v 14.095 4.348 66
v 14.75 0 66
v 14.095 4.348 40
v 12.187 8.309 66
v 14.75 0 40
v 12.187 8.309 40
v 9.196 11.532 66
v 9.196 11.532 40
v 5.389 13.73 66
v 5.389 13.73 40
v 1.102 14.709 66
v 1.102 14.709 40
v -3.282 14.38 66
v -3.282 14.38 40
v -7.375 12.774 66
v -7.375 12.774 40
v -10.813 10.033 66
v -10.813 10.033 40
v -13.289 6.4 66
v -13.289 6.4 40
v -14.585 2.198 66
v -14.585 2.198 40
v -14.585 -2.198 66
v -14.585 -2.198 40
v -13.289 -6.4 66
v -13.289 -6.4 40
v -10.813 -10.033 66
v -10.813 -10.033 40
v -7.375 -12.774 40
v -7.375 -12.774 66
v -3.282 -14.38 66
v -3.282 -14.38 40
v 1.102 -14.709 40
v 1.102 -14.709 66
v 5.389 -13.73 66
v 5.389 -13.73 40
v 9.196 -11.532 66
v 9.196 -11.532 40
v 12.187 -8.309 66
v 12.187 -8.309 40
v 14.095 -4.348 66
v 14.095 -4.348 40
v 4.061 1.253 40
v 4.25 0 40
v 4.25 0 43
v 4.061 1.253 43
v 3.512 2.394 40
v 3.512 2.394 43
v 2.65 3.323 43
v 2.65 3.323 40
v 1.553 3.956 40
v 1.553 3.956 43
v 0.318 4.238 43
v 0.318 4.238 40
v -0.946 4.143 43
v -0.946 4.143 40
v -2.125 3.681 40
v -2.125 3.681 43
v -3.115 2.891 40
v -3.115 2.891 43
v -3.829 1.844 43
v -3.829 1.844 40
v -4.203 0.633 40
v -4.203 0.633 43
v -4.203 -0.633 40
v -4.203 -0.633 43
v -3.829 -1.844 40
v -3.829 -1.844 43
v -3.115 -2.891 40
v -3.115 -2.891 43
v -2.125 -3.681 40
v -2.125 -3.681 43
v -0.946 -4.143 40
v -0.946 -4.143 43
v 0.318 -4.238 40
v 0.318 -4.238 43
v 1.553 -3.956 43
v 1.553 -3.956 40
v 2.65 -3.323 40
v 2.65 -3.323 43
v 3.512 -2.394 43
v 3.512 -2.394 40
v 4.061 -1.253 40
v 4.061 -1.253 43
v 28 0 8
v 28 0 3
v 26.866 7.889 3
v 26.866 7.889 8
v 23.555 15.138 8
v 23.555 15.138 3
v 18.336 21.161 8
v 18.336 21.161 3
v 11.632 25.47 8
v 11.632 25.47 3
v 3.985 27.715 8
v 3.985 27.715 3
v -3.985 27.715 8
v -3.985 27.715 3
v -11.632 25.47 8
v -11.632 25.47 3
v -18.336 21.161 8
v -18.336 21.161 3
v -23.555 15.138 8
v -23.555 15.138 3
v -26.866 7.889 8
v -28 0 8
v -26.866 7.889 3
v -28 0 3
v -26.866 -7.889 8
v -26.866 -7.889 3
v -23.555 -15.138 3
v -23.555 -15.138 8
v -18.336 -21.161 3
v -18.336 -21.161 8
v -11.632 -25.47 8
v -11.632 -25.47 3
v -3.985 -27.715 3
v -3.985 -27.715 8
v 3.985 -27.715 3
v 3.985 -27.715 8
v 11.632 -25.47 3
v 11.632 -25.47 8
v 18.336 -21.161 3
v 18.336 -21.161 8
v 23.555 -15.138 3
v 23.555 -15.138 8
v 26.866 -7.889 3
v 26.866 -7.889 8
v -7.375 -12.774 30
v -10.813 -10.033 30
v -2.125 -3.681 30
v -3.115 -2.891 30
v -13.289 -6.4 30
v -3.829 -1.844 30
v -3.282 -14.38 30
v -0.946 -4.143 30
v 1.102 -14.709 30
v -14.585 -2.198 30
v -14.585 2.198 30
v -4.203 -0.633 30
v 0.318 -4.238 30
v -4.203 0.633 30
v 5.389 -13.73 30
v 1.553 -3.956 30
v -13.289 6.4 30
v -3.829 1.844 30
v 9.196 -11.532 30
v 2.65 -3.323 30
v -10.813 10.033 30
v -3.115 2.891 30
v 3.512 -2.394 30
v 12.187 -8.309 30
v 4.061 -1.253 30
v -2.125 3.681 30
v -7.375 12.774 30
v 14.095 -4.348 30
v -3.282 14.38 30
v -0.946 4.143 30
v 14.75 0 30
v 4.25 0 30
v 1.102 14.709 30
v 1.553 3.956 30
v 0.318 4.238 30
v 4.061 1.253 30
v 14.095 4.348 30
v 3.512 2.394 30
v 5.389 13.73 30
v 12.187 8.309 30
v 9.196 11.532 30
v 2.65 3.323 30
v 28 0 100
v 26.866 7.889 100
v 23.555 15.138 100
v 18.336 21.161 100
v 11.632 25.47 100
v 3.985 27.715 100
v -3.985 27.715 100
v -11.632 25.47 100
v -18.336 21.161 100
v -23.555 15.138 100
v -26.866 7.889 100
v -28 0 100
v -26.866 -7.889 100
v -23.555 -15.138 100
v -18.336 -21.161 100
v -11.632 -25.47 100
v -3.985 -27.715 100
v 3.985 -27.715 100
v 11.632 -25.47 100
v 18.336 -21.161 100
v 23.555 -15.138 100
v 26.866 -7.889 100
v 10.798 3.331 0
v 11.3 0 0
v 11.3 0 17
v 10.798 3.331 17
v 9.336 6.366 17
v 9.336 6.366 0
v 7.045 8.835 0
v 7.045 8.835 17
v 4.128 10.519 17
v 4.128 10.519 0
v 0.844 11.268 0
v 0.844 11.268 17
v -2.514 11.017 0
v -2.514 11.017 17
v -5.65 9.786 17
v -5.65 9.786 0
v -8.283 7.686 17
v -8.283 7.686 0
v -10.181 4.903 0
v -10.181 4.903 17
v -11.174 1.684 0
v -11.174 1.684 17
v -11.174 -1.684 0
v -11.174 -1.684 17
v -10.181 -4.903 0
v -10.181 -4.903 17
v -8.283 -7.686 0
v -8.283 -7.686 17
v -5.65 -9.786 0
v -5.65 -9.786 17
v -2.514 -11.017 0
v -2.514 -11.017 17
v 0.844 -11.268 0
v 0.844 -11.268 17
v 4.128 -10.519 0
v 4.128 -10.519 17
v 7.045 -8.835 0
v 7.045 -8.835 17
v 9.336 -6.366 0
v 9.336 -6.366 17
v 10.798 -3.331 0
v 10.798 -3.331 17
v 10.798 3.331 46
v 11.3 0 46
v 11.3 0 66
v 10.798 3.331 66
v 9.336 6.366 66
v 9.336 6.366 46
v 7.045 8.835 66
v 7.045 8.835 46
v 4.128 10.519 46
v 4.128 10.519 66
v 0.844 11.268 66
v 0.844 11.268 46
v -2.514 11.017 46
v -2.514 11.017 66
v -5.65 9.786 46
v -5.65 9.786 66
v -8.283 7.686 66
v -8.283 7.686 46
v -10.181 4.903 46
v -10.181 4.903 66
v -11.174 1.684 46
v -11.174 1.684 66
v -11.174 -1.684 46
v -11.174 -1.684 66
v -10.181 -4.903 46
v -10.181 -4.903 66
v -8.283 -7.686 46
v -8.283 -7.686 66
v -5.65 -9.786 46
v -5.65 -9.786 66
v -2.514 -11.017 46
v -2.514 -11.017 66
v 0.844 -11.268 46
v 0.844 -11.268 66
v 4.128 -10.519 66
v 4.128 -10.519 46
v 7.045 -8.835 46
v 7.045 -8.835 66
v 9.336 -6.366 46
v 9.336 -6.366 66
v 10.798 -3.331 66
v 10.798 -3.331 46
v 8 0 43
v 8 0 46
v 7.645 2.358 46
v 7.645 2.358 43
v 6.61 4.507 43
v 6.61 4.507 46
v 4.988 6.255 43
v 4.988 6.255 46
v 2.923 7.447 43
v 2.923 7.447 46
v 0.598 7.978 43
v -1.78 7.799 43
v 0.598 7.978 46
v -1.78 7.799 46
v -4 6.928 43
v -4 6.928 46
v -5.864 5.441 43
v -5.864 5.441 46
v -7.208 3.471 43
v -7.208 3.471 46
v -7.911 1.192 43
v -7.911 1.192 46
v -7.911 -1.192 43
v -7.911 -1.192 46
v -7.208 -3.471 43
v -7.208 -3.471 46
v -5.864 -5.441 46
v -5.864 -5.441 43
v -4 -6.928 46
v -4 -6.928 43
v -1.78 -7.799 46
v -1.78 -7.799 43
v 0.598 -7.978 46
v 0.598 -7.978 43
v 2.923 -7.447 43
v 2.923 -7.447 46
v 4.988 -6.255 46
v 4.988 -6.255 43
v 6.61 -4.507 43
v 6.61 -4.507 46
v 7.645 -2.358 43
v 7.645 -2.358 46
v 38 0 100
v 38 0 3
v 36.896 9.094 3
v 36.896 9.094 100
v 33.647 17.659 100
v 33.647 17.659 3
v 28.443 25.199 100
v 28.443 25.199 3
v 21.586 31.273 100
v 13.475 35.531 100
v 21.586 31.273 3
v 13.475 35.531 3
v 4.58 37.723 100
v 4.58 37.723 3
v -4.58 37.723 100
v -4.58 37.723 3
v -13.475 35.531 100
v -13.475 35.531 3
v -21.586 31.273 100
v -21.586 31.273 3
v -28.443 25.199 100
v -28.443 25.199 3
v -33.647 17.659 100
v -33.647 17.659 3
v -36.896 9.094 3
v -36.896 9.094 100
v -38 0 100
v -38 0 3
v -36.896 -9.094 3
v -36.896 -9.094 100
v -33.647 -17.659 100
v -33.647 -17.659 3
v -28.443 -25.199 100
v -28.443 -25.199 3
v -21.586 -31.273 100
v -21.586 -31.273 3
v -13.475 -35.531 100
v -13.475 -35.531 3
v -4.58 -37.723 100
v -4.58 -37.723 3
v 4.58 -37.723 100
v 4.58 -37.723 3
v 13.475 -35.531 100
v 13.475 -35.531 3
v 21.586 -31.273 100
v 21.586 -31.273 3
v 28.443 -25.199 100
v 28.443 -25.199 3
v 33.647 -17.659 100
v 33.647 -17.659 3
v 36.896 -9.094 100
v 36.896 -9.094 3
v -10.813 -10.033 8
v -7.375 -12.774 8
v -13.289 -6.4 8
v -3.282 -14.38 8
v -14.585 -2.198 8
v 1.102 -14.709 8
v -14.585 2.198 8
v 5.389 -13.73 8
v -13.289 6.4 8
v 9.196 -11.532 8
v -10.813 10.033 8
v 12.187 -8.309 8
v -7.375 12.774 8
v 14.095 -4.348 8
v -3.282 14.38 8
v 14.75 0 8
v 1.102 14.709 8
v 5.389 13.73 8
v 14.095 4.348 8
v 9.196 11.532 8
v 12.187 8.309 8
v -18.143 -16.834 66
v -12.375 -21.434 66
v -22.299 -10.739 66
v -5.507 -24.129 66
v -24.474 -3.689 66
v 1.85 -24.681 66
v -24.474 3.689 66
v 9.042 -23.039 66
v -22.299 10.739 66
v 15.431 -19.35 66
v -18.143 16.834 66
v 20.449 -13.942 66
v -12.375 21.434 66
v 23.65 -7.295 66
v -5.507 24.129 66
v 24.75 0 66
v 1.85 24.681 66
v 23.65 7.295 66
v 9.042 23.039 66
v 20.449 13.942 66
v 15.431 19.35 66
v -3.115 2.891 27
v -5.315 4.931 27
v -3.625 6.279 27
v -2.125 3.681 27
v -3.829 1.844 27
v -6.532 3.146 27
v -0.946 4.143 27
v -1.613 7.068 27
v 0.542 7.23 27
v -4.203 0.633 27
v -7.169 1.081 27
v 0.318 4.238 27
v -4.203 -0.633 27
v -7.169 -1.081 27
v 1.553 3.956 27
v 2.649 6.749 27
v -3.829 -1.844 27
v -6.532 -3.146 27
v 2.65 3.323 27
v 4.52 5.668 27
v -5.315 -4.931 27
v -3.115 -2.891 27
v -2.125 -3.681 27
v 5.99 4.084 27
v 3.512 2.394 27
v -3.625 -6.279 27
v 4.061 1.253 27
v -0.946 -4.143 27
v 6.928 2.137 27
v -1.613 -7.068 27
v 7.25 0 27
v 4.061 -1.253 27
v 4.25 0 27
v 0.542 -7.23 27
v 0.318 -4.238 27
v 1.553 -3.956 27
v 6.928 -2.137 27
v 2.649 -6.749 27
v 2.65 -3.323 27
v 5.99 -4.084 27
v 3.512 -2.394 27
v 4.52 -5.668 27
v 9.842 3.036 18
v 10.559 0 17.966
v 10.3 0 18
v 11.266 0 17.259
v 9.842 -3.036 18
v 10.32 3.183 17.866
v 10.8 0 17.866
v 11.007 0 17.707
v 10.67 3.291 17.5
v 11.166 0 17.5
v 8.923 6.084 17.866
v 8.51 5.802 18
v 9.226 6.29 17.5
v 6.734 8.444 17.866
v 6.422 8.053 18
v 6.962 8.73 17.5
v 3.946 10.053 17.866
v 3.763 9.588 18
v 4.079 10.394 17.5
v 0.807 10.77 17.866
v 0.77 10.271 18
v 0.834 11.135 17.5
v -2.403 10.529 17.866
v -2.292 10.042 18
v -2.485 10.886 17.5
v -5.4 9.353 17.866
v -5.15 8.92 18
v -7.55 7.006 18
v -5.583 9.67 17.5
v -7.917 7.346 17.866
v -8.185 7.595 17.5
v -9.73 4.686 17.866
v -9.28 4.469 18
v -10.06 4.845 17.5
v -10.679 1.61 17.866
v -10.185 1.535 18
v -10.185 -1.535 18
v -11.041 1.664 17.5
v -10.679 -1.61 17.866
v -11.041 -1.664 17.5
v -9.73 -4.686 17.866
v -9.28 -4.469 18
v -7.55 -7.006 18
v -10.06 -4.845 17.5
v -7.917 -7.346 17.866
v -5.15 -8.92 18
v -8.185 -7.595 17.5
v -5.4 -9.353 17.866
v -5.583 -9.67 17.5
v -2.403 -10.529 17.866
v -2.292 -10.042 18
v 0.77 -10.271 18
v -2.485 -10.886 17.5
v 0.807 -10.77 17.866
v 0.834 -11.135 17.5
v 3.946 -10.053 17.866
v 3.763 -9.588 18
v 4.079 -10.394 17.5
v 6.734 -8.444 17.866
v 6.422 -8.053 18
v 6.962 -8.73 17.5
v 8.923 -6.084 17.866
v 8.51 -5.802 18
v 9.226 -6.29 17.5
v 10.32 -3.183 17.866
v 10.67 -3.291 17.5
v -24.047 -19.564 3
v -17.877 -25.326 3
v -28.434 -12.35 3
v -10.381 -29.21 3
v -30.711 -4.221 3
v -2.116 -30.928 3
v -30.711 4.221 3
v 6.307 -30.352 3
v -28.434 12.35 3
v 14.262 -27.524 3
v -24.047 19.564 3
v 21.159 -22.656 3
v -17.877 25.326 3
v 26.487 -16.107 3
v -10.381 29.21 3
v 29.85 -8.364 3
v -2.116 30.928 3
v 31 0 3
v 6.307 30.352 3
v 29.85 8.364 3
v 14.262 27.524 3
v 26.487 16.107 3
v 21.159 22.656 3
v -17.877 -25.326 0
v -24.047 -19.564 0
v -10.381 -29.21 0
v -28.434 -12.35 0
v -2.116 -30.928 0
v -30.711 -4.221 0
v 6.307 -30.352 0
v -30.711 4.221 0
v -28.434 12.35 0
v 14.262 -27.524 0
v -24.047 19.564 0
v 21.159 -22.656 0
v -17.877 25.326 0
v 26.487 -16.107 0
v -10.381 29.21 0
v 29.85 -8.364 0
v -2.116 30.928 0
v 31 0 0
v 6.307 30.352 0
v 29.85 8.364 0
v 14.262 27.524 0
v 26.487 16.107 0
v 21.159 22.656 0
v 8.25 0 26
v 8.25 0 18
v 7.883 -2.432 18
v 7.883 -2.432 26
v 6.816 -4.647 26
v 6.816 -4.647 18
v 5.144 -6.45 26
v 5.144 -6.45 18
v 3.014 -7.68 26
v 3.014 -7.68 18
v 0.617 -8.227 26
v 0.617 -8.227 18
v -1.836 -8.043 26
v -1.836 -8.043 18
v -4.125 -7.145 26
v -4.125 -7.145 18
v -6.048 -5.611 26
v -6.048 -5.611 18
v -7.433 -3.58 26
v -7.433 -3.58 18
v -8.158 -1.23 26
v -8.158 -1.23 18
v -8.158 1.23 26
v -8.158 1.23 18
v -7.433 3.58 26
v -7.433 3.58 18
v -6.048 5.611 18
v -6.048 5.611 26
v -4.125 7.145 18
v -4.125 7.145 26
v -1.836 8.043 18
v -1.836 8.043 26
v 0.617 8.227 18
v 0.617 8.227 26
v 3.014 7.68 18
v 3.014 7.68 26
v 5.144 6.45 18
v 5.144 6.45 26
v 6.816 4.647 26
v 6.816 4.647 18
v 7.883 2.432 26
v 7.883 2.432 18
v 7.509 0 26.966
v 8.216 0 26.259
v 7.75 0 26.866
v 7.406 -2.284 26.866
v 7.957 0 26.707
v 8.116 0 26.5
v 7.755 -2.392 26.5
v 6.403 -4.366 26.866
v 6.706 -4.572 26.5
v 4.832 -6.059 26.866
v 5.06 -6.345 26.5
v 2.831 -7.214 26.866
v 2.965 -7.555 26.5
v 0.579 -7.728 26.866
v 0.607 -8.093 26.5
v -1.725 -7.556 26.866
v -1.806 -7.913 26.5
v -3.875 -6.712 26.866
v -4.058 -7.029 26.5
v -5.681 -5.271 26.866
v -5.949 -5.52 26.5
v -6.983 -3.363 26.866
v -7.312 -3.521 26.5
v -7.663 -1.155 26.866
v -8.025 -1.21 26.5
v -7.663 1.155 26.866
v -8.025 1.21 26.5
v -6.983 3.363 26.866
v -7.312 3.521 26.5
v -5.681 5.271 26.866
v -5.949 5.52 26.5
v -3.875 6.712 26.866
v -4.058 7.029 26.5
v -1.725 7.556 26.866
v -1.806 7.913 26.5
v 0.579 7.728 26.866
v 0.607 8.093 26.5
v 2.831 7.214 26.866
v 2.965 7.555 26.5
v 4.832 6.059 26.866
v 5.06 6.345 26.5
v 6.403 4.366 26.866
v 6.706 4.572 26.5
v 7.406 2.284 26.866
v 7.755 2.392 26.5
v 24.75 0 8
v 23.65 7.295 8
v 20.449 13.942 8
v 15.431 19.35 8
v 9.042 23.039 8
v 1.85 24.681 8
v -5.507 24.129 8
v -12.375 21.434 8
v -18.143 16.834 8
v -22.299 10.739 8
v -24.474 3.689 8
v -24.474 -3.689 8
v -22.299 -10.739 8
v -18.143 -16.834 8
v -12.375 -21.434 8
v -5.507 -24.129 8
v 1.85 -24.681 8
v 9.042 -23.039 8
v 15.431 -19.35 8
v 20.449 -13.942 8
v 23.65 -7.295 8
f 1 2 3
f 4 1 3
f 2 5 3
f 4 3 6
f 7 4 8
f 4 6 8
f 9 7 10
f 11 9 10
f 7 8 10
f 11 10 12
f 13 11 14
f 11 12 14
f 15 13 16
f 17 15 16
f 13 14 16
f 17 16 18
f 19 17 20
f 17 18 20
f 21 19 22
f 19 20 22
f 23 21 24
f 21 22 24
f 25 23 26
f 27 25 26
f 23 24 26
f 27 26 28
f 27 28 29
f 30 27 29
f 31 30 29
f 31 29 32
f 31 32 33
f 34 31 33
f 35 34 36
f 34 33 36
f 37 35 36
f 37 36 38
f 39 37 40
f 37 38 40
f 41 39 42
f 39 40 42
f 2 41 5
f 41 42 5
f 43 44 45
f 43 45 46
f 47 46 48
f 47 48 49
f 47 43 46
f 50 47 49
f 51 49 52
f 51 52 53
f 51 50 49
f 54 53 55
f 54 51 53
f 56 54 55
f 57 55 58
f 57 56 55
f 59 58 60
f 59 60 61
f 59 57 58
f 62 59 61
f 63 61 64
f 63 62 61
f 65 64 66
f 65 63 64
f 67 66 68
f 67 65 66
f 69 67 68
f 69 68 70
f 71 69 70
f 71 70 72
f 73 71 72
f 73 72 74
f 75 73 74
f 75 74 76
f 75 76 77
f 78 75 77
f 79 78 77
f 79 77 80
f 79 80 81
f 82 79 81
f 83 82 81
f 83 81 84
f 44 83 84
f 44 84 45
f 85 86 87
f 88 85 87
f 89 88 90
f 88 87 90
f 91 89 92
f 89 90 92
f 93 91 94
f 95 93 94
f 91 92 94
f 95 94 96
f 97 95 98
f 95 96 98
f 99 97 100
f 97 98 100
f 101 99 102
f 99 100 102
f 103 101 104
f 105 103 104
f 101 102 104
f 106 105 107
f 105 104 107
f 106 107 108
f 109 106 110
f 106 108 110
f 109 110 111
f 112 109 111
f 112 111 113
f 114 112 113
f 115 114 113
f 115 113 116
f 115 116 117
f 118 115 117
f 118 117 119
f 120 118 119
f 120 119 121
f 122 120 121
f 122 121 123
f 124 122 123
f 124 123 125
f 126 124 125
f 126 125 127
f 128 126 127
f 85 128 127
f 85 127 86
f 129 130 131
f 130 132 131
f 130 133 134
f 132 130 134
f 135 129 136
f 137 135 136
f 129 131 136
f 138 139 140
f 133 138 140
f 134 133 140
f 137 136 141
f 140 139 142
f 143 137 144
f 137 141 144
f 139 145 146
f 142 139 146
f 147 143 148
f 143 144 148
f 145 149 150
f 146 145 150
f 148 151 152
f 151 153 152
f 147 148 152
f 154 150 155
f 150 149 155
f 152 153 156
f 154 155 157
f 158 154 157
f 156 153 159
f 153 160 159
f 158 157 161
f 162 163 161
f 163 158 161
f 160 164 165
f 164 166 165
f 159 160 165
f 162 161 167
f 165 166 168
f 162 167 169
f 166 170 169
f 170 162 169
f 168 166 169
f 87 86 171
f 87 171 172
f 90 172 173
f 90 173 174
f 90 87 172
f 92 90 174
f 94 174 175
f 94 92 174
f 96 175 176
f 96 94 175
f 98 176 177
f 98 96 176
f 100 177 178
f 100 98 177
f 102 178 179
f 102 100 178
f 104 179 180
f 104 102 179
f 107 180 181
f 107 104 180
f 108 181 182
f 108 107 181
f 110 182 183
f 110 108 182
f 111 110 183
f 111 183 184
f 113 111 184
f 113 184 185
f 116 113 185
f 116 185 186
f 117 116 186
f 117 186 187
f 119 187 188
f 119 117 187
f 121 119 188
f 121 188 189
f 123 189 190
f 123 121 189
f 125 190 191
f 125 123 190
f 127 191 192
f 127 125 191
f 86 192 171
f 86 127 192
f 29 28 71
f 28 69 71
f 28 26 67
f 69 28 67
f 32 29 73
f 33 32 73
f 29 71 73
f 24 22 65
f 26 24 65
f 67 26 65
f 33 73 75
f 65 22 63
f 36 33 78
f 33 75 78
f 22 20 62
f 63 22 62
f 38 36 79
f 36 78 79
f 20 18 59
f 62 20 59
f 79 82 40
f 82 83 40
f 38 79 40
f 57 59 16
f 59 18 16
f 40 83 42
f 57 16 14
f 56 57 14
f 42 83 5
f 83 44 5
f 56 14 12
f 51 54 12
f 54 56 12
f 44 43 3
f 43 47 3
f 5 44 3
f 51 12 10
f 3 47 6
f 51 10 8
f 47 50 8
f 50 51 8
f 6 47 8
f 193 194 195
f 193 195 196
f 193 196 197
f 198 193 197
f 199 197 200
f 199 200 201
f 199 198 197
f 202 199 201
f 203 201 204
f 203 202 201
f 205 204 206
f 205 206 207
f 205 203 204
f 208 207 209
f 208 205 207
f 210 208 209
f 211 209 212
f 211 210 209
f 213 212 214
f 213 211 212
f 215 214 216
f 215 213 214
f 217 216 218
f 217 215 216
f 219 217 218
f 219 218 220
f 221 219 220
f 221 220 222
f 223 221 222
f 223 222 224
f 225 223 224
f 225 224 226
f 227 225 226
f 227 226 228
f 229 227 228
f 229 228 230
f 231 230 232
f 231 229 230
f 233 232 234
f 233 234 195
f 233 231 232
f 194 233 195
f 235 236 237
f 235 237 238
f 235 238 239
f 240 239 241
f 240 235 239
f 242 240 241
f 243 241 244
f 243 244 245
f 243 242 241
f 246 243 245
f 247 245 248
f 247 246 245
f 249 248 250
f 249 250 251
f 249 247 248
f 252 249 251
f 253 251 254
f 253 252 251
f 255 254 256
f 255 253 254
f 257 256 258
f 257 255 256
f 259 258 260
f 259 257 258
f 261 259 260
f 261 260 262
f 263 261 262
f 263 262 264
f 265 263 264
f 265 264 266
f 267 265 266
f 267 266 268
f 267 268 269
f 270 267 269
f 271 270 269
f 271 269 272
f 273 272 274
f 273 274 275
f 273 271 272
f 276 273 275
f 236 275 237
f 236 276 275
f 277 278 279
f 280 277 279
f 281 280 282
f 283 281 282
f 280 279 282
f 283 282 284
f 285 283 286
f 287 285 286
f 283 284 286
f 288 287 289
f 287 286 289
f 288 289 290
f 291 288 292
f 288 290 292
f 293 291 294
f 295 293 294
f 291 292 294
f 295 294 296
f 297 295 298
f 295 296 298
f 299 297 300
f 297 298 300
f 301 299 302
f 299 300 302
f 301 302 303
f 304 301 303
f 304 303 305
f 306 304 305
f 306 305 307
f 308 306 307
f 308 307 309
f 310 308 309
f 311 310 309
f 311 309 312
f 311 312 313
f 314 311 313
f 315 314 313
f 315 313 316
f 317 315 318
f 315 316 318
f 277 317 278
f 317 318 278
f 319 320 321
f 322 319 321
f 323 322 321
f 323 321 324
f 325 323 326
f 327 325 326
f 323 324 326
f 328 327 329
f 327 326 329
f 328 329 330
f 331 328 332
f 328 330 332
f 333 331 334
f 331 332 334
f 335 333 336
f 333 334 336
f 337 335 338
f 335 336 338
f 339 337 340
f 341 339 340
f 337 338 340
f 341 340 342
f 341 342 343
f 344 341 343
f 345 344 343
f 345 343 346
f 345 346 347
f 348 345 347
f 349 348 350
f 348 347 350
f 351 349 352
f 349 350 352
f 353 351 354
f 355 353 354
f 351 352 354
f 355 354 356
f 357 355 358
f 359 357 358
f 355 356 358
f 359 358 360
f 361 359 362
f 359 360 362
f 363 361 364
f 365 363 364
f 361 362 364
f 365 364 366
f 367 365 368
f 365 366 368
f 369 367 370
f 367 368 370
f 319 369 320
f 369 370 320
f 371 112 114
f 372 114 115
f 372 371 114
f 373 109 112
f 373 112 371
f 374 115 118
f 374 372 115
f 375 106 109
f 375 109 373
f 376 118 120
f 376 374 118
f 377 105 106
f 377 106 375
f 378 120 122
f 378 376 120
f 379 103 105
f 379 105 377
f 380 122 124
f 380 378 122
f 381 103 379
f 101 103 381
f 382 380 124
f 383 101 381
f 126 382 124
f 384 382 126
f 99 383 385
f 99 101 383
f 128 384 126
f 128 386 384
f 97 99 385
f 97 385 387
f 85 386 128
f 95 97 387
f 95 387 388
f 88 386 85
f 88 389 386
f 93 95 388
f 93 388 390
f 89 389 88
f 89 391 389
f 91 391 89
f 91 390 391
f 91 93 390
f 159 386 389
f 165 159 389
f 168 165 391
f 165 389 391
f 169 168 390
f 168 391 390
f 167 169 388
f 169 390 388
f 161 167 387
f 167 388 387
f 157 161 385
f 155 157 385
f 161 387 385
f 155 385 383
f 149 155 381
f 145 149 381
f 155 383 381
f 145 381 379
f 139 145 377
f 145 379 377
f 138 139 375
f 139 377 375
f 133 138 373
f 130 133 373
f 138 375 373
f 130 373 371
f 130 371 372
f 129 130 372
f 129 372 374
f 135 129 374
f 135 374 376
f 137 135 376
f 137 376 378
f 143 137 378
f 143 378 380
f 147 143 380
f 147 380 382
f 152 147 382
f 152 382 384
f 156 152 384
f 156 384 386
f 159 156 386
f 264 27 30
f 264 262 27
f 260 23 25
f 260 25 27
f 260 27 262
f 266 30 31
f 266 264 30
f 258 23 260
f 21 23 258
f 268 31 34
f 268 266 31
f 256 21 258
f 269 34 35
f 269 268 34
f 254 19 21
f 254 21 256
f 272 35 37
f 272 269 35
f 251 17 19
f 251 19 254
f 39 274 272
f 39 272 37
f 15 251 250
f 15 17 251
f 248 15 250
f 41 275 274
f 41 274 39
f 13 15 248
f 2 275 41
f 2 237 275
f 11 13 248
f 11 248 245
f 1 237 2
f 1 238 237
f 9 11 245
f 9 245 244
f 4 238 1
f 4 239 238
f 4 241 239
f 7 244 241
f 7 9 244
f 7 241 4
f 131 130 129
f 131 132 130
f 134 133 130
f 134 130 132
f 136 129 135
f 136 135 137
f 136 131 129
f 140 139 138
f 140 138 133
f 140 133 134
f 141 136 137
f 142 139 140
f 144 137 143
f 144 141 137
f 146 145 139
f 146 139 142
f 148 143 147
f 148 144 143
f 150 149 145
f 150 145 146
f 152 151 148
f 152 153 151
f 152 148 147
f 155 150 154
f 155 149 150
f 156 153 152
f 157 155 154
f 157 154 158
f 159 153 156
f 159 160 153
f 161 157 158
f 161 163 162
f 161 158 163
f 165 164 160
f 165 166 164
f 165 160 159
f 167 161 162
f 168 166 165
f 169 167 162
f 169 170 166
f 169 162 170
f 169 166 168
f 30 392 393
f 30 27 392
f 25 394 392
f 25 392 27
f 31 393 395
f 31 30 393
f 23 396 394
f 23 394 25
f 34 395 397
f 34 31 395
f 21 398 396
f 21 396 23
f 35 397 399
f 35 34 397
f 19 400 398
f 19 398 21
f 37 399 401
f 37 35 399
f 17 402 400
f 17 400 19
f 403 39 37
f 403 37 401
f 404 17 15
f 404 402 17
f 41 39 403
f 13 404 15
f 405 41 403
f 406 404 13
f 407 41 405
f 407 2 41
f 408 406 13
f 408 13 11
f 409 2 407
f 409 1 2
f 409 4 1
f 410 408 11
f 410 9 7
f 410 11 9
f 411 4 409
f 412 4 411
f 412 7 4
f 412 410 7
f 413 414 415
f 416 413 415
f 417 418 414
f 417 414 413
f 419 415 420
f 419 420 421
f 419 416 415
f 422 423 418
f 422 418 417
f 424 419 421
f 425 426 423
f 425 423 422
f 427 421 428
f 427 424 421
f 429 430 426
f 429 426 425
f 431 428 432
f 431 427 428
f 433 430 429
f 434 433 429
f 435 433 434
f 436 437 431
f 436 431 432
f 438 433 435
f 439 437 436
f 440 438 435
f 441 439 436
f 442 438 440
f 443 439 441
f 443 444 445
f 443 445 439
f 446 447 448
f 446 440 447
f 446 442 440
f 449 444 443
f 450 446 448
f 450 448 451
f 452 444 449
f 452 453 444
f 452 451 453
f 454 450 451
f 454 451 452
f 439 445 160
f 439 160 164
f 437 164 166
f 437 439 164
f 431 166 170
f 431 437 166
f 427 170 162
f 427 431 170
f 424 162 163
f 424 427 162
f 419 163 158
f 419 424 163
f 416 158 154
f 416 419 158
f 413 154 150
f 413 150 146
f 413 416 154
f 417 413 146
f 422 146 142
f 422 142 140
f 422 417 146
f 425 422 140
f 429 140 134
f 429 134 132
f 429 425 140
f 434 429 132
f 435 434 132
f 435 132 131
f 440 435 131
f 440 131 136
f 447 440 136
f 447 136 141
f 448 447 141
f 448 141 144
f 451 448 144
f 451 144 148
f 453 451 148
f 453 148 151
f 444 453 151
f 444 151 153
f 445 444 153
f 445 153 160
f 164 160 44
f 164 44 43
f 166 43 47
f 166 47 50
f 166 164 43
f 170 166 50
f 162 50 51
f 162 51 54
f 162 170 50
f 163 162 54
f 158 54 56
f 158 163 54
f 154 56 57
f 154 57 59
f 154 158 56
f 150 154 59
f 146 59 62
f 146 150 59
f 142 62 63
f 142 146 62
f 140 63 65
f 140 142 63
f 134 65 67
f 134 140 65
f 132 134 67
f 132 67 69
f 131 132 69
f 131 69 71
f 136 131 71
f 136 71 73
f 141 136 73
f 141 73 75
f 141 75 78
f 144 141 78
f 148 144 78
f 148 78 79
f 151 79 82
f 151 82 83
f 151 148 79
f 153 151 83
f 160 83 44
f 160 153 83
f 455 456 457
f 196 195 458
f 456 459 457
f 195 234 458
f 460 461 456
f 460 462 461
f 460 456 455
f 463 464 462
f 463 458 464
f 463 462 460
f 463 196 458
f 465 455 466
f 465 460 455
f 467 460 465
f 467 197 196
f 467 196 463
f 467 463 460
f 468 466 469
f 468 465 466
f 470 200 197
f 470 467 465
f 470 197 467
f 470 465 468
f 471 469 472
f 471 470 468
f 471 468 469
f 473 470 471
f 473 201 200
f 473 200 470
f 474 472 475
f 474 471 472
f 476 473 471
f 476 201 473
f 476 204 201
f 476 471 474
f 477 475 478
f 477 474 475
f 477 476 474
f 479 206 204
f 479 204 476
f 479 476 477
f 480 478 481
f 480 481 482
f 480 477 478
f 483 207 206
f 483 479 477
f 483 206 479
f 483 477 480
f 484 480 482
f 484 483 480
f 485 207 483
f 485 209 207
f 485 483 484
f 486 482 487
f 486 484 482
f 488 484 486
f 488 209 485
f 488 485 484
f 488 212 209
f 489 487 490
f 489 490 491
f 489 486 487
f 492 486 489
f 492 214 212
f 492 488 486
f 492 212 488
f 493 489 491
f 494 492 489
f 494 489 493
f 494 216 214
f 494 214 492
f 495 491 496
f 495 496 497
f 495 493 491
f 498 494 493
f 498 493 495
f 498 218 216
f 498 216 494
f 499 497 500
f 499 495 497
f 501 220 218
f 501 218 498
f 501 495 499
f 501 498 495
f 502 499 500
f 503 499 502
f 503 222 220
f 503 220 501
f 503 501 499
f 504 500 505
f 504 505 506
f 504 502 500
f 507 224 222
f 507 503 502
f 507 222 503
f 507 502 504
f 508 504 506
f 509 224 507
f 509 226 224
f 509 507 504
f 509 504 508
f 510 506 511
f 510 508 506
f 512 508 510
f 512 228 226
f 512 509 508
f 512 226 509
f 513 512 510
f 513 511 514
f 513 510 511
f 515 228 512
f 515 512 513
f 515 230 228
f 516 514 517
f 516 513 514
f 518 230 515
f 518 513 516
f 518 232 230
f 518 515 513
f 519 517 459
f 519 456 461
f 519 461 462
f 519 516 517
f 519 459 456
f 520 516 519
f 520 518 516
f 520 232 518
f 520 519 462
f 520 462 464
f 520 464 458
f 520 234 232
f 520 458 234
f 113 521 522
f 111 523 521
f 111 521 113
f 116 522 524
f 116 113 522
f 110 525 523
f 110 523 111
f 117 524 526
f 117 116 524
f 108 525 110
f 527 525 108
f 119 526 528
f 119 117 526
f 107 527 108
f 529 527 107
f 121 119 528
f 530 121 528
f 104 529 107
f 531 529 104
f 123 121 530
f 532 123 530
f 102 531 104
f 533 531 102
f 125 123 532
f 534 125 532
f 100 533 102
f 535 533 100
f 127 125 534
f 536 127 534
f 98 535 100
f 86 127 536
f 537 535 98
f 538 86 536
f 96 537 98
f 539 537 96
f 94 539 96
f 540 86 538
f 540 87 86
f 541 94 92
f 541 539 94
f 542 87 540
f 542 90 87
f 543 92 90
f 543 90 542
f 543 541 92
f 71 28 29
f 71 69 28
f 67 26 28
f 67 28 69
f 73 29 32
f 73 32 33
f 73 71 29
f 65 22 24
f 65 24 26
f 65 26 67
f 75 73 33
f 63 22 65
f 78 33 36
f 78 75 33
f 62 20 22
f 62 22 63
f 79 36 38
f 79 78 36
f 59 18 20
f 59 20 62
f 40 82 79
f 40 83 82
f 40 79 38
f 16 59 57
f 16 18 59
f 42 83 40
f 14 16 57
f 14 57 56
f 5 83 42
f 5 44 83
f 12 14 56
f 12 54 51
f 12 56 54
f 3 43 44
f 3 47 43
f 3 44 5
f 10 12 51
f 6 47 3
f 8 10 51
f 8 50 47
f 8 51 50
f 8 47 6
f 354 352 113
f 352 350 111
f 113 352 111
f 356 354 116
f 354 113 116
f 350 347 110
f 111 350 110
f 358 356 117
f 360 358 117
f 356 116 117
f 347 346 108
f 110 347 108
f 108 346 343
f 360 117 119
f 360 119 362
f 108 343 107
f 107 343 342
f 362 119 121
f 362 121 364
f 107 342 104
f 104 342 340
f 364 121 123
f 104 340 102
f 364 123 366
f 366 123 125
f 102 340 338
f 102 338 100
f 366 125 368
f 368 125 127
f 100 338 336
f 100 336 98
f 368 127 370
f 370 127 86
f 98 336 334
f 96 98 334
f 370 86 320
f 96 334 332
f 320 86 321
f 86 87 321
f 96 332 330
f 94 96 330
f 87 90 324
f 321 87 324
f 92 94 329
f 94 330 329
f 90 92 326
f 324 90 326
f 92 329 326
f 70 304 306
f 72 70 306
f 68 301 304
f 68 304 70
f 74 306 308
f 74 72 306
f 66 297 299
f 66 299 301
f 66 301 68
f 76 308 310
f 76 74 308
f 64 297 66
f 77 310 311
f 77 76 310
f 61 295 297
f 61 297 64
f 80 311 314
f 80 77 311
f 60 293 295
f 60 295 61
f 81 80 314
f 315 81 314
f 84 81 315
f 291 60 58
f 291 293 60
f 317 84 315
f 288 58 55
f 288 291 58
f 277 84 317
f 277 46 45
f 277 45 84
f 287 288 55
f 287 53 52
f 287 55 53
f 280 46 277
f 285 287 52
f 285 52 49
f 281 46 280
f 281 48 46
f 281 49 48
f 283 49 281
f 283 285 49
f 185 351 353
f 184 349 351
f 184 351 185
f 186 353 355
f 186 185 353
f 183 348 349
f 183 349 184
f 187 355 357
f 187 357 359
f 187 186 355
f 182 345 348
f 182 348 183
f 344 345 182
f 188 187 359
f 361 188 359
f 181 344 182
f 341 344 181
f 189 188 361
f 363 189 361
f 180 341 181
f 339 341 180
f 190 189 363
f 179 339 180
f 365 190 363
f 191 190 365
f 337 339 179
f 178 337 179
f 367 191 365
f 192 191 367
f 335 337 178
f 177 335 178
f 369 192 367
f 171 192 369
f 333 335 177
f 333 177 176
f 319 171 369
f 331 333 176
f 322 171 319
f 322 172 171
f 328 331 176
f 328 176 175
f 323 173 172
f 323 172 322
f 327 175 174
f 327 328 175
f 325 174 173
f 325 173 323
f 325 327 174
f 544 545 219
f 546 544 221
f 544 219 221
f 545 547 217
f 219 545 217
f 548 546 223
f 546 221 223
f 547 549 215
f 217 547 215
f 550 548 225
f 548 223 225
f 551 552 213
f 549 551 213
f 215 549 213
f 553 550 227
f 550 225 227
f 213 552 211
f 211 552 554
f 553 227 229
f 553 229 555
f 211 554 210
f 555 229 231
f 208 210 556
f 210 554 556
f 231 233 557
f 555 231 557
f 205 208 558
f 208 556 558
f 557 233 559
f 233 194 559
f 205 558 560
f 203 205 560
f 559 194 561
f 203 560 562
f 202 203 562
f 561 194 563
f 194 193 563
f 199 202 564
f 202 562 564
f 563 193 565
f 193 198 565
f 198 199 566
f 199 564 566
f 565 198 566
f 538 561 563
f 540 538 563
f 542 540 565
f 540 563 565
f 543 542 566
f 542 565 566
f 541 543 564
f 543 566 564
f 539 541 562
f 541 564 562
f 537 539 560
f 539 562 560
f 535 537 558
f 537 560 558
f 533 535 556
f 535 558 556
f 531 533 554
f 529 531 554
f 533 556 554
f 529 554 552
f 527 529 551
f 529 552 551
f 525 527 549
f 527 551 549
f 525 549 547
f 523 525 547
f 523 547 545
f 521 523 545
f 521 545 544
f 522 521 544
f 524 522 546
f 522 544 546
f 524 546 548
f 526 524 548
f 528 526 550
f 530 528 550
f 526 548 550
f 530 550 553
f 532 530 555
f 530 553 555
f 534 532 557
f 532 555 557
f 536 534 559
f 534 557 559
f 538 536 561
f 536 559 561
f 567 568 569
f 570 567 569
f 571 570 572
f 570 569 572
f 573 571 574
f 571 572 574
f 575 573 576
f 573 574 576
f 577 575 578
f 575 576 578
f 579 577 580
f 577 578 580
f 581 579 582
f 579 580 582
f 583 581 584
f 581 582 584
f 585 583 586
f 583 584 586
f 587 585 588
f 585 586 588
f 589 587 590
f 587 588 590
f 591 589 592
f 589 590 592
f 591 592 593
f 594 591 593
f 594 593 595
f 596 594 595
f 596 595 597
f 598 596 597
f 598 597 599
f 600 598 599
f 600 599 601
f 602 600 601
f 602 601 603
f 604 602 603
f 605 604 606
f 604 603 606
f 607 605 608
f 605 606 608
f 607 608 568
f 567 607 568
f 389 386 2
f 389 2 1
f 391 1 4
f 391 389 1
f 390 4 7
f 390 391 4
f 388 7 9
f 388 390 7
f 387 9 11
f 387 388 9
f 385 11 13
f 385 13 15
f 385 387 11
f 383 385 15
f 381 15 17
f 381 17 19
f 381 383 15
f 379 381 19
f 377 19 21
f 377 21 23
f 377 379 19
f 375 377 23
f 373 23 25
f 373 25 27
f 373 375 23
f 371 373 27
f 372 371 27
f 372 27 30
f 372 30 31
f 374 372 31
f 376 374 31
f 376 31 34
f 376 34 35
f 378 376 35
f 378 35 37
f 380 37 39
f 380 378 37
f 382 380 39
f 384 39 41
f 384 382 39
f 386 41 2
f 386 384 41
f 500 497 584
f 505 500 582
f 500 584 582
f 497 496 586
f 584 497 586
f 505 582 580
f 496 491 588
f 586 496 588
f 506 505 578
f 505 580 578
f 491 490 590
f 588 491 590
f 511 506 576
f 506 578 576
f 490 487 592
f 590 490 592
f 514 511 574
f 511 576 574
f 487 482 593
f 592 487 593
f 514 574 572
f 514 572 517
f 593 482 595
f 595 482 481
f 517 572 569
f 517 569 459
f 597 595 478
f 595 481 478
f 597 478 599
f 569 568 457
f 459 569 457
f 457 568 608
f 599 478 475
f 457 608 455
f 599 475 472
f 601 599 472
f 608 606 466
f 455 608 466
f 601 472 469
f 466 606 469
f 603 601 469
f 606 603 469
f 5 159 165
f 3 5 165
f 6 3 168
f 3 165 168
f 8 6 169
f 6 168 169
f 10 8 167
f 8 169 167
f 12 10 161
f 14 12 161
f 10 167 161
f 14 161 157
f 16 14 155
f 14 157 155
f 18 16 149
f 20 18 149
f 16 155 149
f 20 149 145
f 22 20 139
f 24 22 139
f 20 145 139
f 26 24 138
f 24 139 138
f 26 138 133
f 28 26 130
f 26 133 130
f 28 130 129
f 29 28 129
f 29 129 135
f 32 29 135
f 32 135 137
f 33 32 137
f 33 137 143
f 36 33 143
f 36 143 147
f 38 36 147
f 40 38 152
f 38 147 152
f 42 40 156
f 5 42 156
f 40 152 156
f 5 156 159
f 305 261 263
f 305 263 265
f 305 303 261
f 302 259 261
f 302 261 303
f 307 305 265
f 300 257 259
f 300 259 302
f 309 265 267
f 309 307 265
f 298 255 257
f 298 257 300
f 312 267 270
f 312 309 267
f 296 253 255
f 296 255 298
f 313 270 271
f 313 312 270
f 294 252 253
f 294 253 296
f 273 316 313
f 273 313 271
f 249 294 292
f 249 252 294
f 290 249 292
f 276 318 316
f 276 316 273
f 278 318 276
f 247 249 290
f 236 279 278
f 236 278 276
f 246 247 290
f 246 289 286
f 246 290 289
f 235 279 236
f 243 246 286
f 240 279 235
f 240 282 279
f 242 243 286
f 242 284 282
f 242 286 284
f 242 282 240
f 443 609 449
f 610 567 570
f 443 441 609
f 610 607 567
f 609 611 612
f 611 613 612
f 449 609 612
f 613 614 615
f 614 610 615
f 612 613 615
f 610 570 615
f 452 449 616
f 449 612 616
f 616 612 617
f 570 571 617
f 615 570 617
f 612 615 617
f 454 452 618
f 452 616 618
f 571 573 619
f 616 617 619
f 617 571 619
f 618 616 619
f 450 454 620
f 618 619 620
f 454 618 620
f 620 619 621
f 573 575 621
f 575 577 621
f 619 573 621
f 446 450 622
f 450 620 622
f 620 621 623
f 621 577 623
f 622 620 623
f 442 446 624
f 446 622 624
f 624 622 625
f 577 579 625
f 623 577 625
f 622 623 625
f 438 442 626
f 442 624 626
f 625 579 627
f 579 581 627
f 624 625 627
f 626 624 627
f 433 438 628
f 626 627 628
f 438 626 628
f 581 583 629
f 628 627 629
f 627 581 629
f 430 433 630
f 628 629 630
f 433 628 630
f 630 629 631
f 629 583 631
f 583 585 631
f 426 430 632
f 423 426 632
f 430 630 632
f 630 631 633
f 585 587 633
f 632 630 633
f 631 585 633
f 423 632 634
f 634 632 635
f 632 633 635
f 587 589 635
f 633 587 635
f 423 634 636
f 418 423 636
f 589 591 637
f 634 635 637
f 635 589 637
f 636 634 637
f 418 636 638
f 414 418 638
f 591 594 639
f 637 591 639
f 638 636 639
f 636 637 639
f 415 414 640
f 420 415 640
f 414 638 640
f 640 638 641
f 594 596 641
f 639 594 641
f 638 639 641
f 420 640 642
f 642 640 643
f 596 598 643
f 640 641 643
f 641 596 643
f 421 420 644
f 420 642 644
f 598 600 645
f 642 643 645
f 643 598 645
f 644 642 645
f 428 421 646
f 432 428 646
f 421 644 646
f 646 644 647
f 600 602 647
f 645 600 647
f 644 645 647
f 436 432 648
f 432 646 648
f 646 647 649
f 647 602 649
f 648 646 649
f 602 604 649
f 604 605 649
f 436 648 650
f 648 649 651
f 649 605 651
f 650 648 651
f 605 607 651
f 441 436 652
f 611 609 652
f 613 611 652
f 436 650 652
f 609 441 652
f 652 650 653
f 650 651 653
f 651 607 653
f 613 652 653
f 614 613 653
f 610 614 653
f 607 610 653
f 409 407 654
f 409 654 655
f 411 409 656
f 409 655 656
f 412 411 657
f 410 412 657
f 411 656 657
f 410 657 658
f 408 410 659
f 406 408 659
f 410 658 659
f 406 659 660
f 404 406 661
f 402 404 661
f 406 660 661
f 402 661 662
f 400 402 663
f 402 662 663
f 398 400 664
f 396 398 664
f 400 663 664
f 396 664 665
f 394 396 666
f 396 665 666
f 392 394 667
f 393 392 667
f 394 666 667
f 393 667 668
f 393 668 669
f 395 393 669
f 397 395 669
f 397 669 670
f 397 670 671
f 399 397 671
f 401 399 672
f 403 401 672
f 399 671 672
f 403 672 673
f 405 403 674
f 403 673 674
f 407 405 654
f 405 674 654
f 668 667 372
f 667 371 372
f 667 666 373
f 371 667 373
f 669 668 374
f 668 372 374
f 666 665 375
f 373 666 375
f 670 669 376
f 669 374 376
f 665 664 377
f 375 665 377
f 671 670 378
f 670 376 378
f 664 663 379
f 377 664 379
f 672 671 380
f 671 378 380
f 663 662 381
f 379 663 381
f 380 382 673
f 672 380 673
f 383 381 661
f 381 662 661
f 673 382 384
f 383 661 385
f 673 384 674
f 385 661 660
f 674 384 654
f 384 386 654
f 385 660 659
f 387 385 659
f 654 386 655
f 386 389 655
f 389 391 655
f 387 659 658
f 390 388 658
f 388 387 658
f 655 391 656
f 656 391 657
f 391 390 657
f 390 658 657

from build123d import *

# Parameters (mm, degrees)
F0_R      = 31
F0_R_2    = 28
F1_DEPTH  = 3
F0_R_3    = 14.75
F2_DEPTH  = 8
F0_R_4    = 11.3
F0_R_5    = 4.25
F3_DEPTH  = 30
F4_DEPTH  = 18
F5_R      = 8.25
F5_R_2    = 4.25
F6_DEPTH  = 9
F7_R      = 1
F8_R      = 38
F8_R_2    = 31
F8_R_3    = 28
F9_DEPTH  = 97
F10_R     = 24.75
F10_R_2   = 14.75
F11_DEPTH = 58
F12_DEPTH = 10
F13_R     = 14.75
F13_R_2   = 11.3
F13_R_3   = 4.25
F14_DEPTH = 6
F15_R     = 8
F15_R_2   = 4.25
F16_DEPTH = 3
F15_R_3   = 14.75
F15_R_4   = 11.3
F17_DEPTH = 20


with BuildPart() as f1:
    # F0 (on Top) → F1 (new body)
    with BuildSketch(Plane.XY):
        Circle(F0_R)
        Circle(F0_R_2, mode=Mode.SUBTRACT)
    extrude(amount=F1_DEPTH)

    # F0 (on Top) → F2 (join)
    with BuildSketch(Plane.XY):
        Circle(F0_R_2)
        Circle(F0_R_3, mode=Mode.SUBTRACT)
    extrude(amount=F2_DEPTH)

    # F0 (on Top) → F3 (join)
    with BuildSketch(Plane.XY):
        Circle(F0_R_3)
        Circle(F0_R_4, mode=Mode.SUBTRACT)
        Circle(F0_R_4)
        Circle(F0_R_5, mode=Mode.SUBTRACT)
    extrude(amount=F3_DEPTH)

    # F0 (on Top) → F4 (cut)
    with BuildSketch(Plane.XY):
        Circle(F0_R_4)
        Circle(F0_R_5, mode=Mode.SUBTRACT)
    extrude(amount=F4_DEPTH, mode=Mode.SUBTRACT)

    # F5 (on face) → F6 (cut)
    with BuildSketch(Plane(origin=(0, 0, 18), x_dir=(1, 0, 0), z_dir=(0, 0, -1))):
        Circle(F5_R)
        Circle(F5_R_2, mode=Mode.SUBTRACT)
    extrude(amount=-F6_DEPTH, mode=Mode.SUBTRACT)

    # F7
    f7_edges = [f1.edges().sort_by_distance(p)[0] for p in [
        (-11.3, 0, 18),
        (-8.25, 0, 27),
    ]]
    fillet(f7_edges, radius=F7_R)


with BuildPart() as f9:
    # F8 (on face) → F9 (new body)
    with BuildSketch(Plane.XY.offset(3)):
        Circle(F8_R)
        Circle(F8_R_2, mode=Mode.SUBTRACT)
        Circle(F8_R_2)
        Circle(F8_R_3, mode=Mode.SUBTRACT)
    extrude(amount=F9_DEPTH)


with BuildPart() as f11:
    # F10 (on face) → F11 (new body)
    with BuildSketch(Plane.XY.offset(8)):
        Circle(F10_R)
        Circle(F10_R_2, mode=Mode.SUBTRACT)
    extrude(amount=F11_DEPTH)


with BuildPart() as f12:
    # F12 (new): a face of the model
    f12_faces = [f1.part.faces().sort_by_distance(p)[0] for p in [
        (-14.3328069991, 0, 30),
    ]]
    extrude(f12_faces, amount=F12_DEPTH)


with BuildPart() as f14:
    # F13 (on face) → F14 (new body)
    with BuildSketch(Plane.XY.offset(40)):
        Circle(F13_R)
        Circle(F13_R_2, mode=Mode.SUBTRACT)
        Circle(F13_R_2)
        Circle(F13_R_3, mode=Mode.SUBTRACT)
    extrude(amount=F14_DEPTH)

    # F15 (on face) → F16 (cut)
    with BuildSketch(Plane.XY.offset(46)):
        Circle(F15_R)
        Circle(F15_R_2, mode=Mode.SUBTRACT)
    extrude(amount=-F16_DEPTH, mode=Mode.SUBTRACT)

    # F15 (on face) → F17 (join, through all)
    with BuildSketch(Plane.XY.offset(46)):
        Circle(F15_R_3)
        Circle(F15_R_4, mode=Mode.SUBTRACT)
    extrude(amount=F17_DEPTH)


solid = Compound([f1.part, f9.part, f11.part, f12.part, f14.part])
